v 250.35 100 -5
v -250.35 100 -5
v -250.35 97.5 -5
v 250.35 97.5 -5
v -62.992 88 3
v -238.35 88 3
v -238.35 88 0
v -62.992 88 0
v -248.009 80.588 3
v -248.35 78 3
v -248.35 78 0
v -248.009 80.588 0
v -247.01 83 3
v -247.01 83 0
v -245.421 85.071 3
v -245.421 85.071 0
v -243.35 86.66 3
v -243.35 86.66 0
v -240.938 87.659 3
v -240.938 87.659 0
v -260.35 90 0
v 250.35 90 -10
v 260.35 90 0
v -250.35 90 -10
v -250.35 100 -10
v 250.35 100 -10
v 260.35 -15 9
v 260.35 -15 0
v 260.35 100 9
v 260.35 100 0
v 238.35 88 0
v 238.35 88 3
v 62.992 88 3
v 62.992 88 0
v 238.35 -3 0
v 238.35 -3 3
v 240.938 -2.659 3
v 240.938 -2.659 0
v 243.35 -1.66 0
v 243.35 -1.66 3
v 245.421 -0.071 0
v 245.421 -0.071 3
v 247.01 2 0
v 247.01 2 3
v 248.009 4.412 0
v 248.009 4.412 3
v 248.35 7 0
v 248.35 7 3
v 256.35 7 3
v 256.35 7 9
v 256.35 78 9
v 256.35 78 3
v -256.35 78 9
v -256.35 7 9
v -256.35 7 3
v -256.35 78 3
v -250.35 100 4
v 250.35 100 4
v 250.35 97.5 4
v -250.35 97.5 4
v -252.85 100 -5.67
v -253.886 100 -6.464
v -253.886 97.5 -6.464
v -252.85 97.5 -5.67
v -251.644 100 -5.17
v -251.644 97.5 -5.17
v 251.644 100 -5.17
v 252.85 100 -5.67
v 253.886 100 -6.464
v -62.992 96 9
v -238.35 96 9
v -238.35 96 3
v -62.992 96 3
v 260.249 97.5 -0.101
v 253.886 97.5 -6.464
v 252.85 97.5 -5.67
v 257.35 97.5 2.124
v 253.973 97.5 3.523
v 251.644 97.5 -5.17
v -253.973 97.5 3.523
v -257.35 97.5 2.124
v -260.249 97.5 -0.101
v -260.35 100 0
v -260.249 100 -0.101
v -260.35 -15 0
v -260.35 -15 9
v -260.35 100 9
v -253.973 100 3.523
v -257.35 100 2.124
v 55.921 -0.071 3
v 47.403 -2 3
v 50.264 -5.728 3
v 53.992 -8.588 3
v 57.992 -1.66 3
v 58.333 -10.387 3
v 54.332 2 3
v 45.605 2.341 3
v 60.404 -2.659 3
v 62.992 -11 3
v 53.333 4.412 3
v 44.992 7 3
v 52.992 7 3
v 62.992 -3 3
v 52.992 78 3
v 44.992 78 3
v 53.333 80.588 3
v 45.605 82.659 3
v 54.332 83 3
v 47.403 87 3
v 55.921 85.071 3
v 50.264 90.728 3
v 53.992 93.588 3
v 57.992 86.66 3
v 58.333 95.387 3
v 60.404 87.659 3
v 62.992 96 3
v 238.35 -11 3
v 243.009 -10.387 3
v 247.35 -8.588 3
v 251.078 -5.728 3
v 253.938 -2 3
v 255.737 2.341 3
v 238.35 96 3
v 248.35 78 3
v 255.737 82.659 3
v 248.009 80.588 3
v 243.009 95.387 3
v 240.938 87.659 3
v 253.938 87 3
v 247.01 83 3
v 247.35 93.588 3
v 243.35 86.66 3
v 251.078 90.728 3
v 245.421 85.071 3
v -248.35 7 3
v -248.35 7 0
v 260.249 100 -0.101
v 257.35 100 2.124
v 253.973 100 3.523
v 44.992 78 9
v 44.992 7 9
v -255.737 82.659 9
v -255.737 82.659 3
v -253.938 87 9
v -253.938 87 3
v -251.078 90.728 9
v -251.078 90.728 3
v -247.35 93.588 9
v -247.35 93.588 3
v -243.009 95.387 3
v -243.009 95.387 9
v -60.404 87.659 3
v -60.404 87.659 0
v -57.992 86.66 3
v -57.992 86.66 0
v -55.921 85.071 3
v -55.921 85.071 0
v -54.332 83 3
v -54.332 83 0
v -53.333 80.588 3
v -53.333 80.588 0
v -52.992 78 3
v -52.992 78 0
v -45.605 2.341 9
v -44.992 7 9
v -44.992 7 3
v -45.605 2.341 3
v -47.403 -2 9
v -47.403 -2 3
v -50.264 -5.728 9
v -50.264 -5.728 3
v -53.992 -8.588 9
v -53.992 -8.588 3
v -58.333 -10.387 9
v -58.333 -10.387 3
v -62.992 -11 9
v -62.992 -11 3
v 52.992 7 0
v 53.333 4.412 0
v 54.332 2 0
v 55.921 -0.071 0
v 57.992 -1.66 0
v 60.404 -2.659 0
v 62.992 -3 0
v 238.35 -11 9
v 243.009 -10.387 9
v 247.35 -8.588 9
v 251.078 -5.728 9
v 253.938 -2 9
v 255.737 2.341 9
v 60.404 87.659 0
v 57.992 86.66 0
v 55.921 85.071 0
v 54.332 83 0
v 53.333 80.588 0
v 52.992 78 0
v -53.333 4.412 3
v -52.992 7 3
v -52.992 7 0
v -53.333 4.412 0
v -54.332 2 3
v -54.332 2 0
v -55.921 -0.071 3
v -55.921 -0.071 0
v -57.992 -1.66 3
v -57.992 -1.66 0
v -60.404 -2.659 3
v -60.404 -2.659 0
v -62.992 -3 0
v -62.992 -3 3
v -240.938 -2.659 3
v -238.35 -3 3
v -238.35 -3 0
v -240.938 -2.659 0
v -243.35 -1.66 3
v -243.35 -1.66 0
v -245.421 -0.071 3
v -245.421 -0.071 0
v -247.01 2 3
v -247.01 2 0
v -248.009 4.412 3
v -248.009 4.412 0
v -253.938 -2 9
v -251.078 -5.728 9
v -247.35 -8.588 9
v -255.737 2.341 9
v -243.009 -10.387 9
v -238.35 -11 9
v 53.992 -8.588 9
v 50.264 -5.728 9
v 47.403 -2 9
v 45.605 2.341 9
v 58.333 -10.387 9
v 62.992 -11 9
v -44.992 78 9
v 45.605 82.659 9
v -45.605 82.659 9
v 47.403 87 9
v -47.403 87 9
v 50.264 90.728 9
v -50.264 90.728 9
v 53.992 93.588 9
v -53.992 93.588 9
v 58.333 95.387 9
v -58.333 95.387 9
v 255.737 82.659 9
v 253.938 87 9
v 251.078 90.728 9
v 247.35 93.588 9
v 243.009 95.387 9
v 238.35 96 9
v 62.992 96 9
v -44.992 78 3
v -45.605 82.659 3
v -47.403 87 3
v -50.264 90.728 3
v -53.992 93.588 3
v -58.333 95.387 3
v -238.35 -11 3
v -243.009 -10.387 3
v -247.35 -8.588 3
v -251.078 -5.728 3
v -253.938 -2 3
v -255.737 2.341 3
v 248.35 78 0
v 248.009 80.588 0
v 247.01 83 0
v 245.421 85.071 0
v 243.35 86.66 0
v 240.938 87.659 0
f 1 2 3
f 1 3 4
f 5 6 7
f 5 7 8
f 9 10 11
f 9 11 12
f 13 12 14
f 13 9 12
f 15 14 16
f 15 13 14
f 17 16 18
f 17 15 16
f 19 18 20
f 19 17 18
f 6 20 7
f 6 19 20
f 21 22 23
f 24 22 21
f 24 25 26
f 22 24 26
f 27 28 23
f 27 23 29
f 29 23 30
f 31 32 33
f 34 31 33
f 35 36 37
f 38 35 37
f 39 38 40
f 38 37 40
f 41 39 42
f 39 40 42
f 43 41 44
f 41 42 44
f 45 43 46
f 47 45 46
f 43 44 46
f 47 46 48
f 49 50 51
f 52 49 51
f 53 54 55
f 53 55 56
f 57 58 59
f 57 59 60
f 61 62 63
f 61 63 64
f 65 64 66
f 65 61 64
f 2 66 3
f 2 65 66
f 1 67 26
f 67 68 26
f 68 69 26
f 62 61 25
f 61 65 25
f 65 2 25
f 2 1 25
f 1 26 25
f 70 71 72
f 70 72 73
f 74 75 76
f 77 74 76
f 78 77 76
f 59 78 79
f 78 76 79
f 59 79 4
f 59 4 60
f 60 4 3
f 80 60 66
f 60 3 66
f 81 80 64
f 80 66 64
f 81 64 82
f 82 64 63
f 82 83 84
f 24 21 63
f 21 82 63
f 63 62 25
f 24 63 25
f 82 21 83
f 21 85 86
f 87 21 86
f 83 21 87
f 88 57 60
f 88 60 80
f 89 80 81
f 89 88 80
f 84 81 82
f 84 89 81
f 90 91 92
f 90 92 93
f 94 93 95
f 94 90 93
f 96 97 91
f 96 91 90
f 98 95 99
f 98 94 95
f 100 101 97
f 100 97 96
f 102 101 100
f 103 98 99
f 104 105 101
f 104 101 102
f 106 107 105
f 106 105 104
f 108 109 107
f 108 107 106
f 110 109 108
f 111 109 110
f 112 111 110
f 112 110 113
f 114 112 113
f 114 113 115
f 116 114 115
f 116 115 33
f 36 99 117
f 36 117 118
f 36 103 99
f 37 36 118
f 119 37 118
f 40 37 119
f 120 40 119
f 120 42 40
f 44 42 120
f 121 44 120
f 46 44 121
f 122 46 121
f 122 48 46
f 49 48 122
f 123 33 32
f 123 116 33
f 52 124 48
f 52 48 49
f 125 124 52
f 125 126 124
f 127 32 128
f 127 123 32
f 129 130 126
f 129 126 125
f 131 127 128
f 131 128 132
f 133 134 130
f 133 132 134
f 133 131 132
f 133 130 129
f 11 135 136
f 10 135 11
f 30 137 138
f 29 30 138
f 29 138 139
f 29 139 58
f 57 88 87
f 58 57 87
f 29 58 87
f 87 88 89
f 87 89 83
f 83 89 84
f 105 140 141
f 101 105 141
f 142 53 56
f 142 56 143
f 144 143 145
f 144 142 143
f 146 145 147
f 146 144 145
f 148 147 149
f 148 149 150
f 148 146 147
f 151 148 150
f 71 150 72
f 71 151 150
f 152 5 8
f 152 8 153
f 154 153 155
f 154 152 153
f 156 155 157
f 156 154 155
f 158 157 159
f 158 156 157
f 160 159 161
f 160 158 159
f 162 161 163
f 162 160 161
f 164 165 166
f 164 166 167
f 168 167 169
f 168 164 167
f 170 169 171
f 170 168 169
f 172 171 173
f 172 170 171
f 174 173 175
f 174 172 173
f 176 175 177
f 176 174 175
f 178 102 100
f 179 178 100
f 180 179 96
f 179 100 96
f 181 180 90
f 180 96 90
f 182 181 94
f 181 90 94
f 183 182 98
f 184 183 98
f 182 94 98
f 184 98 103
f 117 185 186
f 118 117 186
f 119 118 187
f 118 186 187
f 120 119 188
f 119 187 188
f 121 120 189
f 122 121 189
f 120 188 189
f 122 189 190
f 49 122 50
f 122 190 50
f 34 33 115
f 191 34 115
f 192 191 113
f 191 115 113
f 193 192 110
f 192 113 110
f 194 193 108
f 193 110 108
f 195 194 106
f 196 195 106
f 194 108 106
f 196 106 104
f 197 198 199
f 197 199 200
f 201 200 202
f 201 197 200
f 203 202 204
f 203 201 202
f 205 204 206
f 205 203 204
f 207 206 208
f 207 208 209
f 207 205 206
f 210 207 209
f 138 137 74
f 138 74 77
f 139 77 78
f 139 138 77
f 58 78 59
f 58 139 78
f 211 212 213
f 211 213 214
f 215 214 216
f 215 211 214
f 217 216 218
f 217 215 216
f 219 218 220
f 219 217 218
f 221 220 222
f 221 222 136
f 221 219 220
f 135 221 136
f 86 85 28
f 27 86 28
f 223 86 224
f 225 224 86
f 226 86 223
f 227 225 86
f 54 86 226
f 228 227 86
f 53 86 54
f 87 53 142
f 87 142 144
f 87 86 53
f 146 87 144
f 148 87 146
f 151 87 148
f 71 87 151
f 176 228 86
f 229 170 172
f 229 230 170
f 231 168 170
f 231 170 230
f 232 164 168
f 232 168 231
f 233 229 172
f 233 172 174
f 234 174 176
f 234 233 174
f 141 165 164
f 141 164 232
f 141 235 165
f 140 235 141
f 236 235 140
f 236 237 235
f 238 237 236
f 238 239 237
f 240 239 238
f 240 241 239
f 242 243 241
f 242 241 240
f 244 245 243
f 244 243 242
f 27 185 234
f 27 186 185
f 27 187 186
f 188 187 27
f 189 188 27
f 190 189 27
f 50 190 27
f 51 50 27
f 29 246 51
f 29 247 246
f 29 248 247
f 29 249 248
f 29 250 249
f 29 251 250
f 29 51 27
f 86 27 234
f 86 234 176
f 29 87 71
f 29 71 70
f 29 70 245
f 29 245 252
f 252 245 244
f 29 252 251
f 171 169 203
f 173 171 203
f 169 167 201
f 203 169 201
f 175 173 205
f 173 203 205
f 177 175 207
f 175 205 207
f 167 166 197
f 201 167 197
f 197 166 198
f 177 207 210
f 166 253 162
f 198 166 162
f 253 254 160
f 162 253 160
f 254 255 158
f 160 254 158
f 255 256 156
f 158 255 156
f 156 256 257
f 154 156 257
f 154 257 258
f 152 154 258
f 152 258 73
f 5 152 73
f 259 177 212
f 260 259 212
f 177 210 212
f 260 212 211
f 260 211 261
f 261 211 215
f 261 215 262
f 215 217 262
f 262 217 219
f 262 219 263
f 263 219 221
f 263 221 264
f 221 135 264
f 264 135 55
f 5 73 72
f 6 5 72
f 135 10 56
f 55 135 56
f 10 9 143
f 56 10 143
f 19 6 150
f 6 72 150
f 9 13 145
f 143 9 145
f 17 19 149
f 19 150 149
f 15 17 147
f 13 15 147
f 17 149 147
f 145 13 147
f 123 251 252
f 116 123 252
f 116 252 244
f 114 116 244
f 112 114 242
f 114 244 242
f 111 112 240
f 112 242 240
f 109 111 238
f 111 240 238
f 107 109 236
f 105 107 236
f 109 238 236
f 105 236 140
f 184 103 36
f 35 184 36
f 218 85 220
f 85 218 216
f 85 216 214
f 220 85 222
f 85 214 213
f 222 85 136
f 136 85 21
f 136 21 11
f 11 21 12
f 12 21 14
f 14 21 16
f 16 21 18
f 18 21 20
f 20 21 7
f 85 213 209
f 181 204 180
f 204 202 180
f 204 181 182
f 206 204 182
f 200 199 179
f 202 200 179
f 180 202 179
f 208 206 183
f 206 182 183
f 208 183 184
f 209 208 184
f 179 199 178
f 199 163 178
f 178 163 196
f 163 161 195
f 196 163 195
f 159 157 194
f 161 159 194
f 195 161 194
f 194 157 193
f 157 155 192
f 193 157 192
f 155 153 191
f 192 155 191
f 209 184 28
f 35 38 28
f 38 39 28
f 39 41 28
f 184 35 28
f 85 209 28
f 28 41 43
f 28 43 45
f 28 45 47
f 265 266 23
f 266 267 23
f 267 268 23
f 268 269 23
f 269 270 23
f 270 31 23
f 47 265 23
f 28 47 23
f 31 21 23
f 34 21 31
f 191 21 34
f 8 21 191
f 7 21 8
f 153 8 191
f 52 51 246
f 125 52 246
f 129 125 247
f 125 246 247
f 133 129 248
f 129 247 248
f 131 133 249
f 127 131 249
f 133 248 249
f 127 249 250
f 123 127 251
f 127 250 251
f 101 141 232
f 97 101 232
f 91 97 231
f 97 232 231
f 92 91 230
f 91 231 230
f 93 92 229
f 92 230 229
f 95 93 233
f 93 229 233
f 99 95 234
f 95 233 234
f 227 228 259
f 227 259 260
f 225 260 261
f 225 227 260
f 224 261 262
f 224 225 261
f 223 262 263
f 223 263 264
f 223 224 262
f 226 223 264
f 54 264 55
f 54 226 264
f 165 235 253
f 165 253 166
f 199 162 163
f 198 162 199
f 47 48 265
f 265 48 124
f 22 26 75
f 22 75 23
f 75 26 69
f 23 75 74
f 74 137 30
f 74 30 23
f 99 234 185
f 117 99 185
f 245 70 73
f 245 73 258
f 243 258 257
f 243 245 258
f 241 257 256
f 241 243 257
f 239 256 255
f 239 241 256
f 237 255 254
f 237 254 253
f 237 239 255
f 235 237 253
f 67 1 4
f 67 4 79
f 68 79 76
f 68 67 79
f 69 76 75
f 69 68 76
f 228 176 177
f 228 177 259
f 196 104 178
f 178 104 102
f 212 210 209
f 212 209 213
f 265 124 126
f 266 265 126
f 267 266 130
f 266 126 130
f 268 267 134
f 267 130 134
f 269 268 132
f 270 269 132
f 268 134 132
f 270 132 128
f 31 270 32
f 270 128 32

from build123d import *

# Parameters (mm, degrees)
SKETCH1_W           = 520.7
SKETCH1_H           = 115
BOSS_EXTRUDE1_DEPTH = 9
BOSS_EXTRUDE2_DEPTH = 10
CUT_EXTRUDE1_DEPTH  = 9
CUT_EXTRUDE2_DEPTH  = 6
CUT_EXTRUDE3_DEPTH  = 2.5


with BuildPart() as part:
    # Sketch1 → Boss-Extrude1 (new body)
    with BuildSketch(Plane.XY):
        with Locations((0, 42.5)):
            Rectangle(SKETCH1_W, SKETCH1_H)
    extrude(amount=BOSS_EXTRUDE1_DEPTH)

    # Sketch2 → Boss-Extrude2 (add)
    with BuildSketch(Plane(origin=(0, 100, 0), x_dir=(1, 0, 0), z_dir=(0, 1, 0))):
        Polygon((-250.35, 10), (250.35, 10), (260.35, 0), (260.35, -9), (-260.35, -9), (-260.35, 0), align=None)
    extrude(amount=-BOSS_EXTRUDE2_DEPTH)

    # Sketch3 → Cut-Extrude1 (cut)
    with BuildSketch(Plane.XY.offset(9)):
        with BuildLine():
            Line((238.35, 88), (62.991811867, 88))
            ThreePointArc((62.991811867, 88), (55.920744055, 85.071067812), (52.991811867, 78))
            Line((52.991811867, 78), (52.991811867, 7))
            ThreePointArc((52.991811867, 7), (55.920744055, -0.071067812), (62.991811867, -3))
            Line((62.991811867, -3), (238.35, -3))
            ThreePointArc((238.35, -3), (245.421067812, -0.071067812), (248.35, 7))
            Line((248.35, 7), (248.35, 78))
            ThreePointArc((248.35, 78), (245.421067812, 85.071067812), (238.35, 88))
        make_face()
    cut_extrude1 = extrude(amount=-CUT_EXTRUDE1_DEPTH, mode=Mode.SUBTRACT)

    # Sketch4 → Cut-Extrude2 (cut)
    with BuildSketch(Plane.XY.offset(9)):
        with BuildLine():
            Line((62.991811867, -11), (238.35, -11))
            ThreePointArc((238.35, -11), (251.077922061, -5.727922061), (256.35, 7))
            Line((256.35, 7), (256.35, 78))
            ThreePointArc((256.35, 78), (251.077922061, 90.727922061), (238.35, 96))
            Line((238.35, 96), (62.991811867, 96))
            ThreePointArc((62.991811867, 96), (50.263889805, 90.727922061), (44.991811867, 78))
            Line((44.991811867, 78), (44.991811867, 7))
            ThreePointArc((44.991811867, 7), (50.263889805, -5.727922061), (62.991811867, -11))
        make_face()
    cut_extrude2 = extrude(amount=-CUT_EXTRUDE2_DEPTH, mode=Mode.SUBTRACT)

    # Mirror1: Cut-Extrude1, Cut-Extrude2 across plane
    add(cut_extrude1.mirror(Plane(origin=(0, 0, 0), x_dir=(0, 0, 1), z_dir=(1, 0, 0))), mode=Mode.SUBTRACT)
    add(cut_extrude2.mirror(Plane(origin=(0, 0, 0), x_dir=(0, 0, 1), z_dir=(1, 0, 0))), mode=Mode.SUBTRACT)

    # Sketch5 → Cut-Extrude3 (cut)
    with BuildSketch(Plane(origin=(0, 100, 0), x_dir=(1, 0, 0), z_dir=(0, 1, 0))):
        with BuildLine():
            Line((-250.35, 5), (250.35, 5))
            ThreePointArc((250.35, 5), (252.263417162, 5.380602337), (253.885533906, 6.464466094))
            Line((253.885533906, 6.464466094), (260.249494937, 0.100505063))
            ThreePointArc((260.249494937, 0.100505063), (255.707568053, -2.934313455), (250.35, -4))
            Line((250.35, -4), (-250.35, -4))
            ThreePointArc((-250.35, -4), (-255.707568053, -2.934313455), (-260.249494937, 0.100505063))
            Line((-260.249494937, 0.100505063), (-253.885533906, 6.464466094))
            ThreePointArc((-253.885533906, 6.464466094), (-252.263417162, 5.380602337), (-250.35, 5))
        make_face()
    extrude(amount=-CUT_EXTRUDE3_DEPTH, mode=Mode.SUBTRACT)


solid = part.part
